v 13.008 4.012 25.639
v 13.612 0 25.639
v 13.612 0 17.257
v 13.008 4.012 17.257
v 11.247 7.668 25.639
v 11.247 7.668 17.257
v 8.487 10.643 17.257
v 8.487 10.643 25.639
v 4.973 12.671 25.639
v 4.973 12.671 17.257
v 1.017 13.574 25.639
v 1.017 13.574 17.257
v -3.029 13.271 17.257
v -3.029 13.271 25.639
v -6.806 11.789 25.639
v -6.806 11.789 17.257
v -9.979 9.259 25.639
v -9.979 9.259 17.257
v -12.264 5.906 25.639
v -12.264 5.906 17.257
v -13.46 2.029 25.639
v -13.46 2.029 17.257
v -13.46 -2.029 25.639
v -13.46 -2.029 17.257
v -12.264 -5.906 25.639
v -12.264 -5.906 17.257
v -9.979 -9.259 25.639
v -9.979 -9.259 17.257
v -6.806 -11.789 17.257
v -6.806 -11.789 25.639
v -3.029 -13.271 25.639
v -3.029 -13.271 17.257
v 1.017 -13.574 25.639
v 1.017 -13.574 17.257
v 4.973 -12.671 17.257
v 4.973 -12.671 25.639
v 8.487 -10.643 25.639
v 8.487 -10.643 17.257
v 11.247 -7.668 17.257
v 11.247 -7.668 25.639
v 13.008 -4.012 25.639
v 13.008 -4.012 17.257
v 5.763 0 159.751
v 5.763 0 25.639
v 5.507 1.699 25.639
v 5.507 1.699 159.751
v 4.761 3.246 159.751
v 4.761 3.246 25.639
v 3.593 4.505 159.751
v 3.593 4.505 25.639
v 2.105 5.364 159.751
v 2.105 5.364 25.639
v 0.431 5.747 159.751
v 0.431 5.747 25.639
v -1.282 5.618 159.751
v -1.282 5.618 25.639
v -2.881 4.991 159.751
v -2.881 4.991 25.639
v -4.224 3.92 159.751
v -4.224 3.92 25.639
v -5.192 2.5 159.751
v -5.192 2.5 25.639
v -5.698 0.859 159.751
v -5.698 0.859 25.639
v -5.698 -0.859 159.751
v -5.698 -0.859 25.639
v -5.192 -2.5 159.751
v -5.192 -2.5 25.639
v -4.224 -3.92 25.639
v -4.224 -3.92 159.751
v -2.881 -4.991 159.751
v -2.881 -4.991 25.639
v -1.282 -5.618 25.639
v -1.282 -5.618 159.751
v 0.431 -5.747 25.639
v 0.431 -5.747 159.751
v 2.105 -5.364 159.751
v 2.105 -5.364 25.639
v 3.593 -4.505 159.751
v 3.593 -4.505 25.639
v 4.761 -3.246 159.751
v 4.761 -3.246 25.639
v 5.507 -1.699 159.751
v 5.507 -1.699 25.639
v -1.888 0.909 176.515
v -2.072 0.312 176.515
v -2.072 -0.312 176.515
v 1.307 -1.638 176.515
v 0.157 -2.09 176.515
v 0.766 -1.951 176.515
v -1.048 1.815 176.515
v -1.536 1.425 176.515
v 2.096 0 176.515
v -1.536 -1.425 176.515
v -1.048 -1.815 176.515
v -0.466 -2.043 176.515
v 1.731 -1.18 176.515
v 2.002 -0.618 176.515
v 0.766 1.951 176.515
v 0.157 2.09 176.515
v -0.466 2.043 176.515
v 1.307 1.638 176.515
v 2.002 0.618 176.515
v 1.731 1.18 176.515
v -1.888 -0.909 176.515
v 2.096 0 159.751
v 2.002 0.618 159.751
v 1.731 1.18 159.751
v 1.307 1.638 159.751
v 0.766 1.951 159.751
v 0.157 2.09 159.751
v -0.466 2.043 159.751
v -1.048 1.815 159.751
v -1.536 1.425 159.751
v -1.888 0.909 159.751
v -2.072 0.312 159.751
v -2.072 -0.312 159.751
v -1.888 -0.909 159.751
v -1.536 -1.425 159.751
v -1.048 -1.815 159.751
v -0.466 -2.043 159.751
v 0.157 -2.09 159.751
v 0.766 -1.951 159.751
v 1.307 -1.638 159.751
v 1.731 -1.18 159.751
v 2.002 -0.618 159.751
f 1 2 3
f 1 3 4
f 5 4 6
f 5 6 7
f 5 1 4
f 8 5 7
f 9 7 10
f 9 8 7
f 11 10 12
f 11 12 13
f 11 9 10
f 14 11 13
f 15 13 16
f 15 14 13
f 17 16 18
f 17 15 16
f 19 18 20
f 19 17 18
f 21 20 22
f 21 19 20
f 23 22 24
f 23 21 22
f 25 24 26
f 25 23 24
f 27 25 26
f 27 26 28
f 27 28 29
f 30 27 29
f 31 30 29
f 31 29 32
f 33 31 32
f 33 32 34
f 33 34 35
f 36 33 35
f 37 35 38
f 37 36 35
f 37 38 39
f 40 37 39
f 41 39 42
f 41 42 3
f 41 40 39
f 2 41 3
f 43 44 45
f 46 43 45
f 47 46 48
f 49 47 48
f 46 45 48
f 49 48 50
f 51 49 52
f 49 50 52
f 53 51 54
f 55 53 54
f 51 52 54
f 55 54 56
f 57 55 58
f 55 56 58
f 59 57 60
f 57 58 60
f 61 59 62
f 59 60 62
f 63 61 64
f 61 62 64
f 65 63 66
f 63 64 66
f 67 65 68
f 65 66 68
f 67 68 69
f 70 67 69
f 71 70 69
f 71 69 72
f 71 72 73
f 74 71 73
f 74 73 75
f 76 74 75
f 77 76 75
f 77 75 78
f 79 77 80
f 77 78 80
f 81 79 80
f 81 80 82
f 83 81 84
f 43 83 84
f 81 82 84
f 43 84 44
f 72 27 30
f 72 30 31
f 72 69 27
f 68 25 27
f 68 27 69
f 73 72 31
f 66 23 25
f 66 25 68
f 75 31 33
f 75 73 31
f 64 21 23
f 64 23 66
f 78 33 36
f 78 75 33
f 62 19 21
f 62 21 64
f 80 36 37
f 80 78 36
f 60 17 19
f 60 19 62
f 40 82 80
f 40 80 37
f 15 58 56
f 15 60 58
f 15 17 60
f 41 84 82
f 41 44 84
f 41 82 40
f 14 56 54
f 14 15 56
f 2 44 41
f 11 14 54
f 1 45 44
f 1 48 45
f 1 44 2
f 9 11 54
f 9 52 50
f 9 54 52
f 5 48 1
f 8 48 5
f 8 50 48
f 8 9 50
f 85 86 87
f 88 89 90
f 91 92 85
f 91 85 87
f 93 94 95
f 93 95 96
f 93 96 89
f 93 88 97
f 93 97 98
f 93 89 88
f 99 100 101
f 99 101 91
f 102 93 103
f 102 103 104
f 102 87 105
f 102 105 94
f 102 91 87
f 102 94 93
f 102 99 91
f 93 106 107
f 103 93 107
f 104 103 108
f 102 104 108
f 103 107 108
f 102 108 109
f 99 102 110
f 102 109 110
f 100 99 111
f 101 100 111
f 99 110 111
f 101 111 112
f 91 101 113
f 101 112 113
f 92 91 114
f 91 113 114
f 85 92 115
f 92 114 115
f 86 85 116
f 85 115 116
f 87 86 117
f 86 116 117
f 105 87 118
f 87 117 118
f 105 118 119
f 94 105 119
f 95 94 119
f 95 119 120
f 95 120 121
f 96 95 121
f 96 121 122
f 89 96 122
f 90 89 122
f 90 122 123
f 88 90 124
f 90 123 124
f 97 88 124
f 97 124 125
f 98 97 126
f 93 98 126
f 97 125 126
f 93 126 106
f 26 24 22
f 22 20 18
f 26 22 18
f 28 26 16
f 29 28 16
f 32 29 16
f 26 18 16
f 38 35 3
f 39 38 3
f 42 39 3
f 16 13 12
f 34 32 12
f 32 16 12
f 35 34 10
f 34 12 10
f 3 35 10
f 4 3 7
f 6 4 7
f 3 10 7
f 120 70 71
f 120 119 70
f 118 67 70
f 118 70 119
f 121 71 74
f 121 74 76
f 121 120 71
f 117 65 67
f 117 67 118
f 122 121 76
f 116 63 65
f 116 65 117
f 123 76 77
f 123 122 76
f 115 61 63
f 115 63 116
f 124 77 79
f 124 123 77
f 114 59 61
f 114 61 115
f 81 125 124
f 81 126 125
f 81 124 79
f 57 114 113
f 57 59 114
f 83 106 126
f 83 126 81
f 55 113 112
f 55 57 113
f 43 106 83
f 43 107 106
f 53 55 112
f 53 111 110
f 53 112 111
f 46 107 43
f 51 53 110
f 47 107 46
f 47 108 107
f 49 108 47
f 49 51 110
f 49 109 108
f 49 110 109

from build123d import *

# Parameters (mm, degrees)
SKETCH1_R           = 20.6248
BOSS_EXTRUDE1_DEPTH = 12.7
SKETCH2_R           = 8.73125
BOSS_EXTRUDE2_DEPTH = 203.2
SKETCH3_R           = 3.175
BOSS_EXTRUDE3_DEPTH = 25.4
SCALE1_SCALE        = 0.66


with BuildPart() as part:
    # Sketch1 → Boss-Extrude1 (new body)
    with BuildSketch(Plane.XY):
        Circle(SKETCH1_R)
    extrude(amount=-BOSS_EXTRUDE1_DEPTH)

    # Sketch2 → Boss-Extrude2 (add)
    with BuildSketch(Plane.XY):
        Circle(SKETCH2_R)
    extrude(amount=BOSS_EXTRUDE2_DEPTH)

    # Sketch3 → Boss-Extrude3 (add)
    with BuildSketch(Plane.XY.offset(203.2)):
        Circle(SKETCH3_R)
    extrude(amount=BOSS_EXTRUDE3_DEPTH)


with BuildPart() as part_1:
    # Scale1: scaled about (0, 0, 75.409153815)
    add(part.part.scale(SCALE1_SCALE).moved(Location((0, 0, 25.639112297))))


solid = part_1.part
